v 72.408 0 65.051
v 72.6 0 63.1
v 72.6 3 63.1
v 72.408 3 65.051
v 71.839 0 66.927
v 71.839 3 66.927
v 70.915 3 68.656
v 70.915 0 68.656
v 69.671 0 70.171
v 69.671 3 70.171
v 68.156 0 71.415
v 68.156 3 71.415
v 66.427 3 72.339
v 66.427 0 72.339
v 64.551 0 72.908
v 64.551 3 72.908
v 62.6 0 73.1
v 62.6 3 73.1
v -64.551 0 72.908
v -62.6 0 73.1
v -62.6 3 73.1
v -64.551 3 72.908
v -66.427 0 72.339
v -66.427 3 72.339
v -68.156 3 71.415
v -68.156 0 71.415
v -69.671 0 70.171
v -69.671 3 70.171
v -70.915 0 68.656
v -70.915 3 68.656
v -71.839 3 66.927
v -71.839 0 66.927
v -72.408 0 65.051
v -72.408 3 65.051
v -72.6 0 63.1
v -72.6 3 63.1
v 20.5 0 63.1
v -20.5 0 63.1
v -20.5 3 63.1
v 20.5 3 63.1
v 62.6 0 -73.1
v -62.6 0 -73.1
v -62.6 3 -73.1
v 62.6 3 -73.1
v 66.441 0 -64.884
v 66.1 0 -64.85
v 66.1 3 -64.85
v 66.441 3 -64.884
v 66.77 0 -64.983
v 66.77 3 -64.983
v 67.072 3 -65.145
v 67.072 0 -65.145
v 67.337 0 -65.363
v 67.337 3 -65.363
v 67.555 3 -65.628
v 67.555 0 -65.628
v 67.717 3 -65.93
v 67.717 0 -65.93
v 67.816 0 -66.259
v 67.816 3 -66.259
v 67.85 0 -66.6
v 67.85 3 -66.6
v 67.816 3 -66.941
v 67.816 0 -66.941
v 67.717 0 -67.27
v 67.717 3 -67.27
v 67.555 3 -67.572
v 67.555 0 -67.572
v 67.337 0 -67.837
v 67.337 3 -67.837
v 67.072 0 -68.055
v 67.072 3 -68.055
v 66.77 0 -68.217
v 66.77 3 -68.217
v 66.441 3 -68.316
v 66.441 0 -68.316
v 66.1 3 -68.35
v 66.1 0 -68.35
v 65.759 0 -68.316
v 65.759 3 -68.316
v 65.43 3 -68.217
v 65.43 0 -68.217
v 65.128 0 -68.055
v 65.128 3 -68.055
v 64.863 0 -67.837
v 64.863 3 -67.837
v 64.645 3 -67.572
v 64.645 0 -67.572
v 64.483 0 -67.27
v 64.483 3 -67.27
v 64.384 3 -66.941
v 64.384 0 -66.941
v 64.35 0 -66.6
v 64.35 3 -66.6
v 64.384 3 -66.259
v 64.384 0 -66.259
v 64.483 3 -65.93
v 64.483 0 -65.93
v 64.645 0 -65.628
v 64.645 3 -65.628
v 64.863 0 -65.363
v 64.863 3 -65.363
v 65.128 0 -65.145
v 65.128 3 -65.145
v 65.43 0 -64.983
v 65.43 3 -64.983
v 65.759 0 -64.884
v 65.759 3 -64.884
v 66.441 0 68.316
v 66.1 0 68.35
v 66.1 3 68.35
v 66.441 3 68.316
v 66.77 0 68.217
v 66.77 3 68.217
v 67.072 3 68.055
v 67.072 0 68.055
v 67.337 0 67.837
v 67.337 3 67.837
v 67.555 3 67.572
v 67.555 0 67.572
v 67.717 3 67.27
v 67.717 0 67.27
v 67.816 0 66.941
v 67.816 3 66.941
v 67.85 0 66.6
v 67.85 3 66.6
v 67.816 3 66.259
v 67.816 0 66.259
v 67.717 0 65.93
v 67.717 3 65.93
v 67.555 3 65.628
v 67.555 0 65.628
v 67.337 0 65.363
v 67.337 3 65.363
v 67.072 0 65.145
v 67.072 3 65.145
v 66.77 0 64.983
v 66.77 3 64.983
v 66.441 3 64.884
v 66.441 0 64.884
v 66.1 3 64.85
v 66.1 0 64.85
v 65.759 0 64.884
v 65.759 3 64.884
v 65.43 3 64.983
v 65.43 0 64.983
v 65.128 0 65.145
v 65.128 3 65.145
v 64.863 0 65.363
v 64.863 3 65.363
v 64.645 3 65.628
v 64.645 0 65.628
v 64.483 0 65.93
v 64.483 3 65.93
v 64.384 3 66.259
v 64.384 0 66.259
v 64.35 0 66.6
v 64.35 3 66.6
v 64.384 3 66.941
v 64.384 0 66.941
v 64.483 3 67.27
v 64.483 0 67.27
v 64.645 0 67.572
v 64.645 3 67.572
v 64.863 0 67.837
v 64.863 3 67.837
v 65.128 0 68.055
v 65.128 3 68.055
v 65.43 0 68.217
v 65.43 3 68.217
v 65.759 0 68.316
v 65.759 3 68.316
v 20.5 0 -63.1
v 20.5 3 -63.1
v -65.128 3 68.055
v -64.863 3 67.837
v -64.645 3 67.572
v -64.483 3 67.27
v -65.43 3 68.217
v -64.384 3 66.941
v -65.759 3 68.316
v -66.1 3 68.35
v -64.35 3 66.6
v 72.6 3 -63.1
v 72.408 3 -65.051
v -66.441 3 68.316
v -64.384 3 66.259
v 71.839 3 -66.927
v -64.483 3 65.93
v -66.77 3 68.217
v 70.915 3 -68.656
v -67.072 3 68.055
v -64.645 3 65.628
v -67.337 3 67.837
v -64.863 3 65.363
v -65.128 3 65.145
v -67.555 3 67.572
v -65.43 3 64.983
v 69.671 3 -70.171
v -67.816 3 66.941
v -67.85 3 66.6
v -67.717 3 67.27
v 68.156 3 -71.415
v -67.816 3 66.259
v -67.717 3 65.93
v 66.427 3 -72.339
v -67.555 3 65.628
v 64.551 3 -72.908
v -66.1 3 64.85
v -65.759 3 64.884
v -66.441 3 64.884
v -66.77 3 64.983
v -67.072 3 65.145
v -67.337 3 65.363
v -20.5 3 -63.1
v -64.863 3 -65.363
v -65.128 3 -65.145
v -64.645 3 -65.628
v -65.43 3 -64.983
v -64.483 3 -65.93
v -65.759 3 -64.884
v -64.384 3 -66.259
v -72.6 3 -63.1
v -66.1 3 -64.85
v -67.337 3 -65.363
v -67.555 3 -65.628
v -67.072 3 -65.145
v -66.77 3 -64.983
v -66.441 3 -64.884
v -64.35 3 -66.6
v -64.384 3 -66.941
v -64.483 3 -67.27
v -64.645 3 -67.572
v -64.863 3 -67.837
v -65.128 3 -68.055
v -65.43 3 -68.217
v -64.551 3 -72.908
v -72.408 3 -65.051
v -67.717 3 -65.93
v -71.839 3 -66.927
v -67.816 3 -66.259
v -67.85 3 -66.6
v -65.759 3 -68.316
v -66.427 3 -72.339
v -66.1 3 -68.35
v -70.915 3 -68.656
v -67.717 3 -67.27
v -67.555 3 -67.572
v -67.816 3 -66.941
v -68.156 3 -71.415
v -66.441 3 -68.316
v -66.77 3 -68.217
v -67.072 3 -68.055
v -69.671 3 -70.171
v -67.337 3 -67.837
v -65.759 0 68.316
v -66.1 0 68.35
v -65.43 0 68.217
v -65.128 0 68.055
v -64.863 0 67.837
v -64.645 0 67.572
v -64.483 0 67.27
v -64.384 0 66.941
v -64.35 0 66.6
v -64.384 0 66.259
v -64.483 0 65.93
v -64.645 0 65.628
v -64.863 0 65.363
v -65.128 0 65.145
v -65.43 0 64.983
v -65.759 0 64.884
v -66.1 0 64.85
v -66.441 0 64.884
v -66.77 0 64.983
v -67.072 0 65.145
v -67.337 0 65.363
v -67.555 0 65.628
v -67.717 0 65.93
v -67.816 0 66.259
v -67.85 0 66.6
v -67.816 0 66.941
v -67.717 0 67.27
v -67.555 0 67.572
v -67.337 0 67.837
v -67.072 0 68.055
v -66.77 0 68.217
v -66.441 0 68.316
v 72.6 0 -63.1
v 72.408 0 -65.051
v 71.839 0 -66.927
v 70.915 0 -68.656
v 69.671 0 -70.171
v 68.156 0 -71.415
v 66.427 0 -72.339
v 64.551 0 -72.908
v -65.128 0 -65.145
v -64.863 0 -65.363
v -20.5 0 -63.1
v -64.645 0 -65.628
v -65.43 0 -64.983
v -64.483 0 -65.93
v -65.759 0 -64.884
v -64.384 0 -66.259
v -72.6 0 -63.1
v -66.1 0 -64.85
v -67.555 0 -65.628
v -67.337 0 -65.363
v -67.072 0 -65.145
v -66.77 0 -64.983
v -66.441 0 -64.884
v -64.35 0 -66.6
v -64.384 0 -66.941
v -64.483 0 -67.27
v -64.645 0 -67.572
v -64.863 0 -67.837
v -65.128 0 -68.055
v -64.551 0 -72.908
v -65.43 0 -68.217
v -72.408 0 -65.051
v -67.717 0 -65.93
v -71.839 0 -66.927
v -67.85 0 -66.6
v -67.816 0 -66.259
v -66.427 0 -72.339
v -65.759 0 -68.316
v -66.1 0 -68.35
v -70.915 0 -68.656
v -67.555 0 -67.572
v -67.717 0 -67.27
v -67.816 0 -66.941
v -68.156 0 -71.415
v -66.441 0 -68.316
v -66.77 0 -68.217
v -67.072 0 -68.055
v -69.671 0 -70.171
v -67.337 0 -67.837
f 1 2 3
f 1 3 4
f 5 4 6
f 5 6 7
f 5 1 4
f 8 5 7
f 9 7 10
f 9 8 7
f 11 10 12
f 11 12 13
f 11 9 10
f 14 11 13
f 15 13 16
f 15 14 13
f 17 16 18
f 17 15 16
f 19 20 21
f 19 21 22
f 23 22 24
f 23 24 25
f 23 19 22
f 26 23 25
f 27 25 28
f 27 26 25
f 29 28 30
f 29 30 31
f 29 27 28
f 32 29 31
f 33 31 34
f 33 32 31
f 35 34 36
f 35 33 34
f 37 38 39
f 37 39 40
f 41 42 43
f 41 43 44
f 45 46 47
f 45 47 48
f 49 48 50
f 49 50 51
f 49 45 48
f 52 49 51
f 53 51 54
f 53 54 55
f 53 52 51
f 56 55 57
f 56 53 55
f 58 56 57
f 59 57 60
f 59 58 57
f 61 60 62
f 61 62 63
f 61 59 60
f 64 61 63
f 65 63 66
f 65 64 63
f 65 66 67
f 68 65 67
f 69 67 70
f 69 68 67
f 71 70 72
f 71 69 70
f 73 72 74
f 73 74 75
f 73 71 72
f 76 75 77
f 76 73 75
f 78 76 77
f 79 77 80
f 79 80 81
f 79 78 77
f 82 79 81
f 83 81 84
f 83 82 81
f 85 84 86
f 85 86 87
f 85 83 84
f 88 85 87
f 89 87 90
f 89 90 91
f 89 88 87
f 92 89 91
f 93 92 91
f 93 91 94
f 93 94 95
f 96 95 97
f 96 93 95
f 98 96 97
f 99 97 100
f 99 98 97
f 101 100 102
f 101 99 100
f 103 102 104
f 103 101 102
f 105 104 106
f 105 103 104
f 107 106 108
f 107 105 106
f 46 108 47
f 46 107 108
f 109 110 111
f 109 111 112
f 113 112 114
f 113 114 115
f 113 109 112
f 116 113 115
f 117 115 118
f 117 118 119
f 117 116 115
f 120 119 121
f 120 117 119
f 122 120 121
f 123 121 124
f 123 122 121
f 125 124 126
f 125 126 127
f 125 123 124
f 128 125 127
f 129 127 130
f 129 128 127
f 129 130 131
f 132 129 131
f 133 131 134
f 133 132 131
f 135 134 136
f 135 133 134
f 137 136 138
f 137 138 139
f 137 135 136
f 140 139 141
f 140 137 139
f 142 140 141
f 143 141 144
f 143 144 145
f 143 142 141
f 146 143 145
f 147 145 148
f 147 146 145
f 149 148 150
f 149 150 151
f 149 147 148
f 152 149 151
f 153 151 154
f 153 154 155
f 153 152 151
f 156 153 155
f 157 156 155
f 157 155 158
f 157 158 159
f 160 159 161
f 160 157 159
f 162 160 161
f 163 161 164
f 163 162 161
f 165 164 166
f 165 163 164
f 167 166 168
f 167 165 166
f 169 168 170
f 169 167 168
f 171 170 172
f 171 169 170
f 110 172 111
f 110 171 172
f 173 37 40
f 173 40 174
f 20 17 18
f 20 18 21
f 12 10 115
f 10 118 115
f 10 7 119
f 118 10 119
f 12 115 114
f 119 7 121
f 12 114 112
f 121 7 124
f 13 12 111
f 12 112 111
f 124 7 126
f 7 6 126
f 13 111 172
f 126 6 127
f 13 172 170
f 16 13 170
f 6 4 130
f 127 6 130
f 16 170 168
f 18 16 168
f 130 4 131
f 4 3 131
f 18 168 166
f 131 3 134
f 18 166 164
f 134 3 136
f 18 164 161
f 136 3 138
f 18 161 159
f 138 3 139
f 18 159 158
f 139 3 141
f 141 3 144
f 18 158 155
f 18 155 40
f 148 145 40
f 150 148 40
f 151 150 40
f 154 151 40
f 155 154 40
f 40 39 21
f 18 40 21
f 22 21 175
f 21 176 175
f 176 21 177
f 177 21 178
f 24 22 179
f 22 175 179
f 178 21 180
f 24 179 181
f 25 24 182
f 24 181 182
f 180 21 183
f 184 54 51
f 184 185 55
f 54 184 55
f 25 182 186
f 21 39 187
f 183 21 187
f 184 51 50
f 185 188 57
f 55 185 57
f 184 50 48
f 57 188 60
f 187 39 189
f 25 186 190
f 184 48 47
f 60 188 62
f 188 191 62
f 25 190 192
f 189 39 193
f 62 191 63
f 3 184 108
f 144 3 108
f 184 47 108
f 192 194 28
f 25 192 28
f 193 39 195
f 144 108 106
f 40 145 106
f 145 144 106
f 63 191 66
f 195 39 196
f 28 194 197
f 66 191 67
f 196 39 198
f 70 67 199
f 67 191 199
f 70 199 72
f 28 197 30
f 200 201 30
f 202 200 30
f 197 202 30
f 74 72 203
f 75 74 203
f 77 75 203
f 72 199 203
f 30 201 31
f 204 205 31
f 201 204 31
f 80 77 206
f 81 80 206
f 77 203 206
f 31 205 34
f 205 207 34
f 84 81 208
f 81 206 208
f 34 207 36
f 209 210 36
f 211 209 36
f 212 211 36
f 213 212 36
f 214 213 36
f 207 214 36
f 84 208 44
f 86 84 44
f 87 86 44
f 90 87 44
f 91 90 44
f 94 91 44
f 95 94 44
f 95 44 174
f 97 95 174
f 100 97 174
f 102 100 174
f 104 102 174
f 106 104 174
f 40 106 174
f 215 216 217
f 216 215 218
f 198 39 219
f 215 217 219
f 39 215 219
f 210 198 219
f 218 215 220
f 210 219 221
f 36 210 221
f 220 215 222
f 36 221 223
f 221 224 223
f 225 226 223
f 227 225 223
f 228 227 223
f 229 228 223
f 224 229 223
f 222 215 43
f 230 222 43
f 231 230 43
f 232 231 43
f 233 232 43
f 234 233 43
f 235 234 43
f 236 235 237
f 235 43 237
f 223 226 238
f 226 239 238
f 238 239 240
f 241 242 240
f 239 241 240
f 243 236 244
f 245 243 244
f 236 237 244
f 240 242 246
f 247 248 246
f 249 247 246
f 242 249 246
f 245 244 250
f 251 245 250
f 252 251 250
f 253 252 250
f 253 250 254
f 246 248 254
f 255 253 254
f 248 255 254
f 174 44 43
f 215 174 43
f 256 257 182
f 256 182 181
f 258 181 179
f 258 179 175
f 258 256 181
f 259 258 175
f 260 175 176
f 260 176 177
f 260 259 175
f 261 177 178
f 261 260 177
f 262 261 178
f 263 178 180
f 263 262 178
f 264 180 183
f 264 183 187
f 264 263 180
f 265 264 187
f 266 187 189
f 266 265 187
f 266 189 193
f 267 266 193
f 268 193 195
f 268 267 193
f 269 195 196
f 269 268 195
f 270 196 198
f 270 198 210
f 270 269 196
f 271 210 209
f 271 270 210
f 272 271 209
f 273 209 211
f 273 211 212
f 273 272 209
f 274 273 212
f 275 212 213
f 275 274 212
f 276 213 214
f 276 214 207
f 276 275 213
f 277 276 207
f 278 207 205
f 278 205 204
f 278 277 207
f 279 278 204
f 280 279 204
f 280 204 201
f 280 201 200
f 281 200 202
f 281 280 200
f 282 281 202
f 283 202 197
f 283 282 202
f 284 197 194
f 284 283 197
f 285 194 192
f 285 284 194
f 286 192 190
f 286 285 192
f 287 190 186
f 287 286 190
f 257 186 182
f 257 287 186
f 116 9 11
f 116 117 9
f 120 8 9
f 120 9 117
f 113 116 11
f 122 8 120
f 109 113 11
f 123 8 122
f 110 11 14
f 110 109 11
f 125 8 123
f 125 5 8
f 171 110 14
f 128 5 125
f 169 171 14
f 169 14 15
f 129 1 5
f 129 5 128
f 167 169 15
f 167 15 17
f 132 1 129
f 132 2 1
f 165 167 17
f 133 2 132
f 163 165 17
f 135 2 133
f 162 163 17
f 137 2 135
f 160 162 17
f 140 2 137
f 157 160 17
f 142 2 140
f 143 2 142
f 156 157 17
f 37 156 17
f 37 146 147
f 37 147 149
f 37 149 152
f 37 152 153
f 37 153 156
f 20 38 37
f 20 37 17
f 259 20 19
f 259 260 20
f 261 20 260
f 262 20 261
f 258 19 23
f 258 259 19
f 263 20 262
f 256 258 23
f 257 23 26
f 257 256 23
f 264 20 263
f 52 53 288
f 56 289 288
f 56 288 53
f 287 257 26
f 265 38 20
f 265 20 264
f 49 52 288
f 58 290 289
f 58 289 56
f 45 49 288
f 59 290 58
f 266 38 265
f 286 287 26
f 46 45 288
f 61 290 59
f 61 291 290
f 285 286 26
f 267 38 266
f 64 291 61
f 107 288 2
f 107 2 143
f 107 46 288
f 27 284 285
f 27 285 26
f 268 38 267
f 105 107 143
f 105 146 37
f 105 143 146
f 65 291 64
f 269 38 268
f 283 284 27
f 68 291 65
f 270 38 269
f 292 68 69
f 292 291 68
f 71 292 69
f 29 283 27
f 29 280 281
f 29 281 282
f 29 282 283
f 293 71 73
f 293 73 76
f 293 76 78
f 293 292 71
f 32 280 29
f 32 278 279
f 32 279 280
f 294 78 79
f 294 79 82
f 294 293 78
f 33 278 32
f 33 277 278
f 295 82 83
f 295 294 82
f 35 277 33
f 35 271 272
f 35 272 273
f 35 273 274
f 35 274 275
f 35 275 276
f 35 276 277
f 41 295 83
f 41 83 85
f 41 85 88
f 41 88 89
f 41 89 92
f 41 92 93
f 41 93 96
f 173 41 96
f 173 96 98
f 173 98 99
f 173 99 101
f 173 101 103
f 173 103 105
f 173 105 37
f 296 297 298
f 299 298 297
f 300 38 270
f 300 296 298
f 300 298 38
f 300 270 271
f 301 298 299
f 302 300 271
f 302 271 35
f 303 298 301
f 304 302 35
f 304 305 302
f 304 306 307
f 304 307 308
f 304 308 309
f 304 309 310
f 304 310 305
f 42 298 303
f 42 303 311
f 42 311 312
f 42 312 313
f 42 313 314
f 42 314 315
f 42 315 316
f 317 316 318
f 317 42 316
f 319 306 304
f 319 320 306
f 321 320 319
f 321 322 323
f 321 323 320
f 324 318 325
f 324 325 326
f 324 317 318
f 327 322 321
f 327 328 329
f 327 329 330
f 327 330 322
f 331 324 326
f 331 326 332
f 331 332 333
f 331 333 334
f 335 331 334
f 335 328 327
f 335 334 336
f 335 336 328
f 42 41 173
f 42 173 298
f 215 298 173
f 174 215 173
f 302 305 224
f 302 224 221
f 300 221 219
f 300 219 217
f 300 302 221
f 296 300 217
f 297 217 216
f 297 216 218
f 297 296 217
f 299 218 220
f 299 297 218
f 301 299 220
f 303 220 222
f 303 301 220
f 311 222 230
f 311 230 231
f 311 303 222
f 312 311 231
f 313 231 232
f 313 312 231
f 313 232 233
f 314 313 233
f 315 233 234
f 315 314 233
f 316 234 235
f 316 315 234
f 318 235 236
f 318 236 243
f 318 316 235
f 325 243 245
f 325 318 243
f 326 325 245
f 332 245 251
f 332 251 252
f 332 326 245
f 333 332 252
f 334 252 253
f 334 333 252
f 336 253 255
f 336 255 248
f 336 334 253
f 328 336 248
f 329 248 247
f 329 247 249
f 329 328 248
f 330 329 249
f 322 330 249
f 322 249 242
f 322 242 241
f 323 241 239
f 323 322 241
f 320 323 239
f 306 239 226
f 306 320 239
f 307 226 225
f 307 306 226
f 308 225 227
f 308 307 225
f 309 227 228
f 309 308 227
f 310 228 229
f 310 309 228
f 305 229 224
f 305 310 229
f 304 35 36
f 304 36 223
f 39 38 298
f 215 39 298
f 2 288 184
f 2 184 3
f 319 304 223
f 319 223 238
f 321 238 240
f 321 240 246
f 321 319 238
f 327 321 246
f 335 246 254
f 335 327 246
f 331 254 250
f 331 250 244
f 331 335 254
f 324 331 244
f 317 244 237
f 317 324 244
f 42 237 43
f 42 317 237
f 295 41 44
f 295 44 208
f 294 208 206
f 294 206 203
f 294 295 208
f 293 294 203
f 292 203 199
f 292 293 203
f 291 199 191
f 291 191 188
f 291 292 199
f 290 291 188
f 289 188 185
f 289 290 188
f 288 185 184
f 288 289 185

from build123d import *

# Parameters (mm, degrees)
ESQUISSE1_R        = 1.75
ESQUISSE1_W        = 41
ESQUISSE1_H        = 126.2
BOSS_EXTRU_1_DEPTH = 3


with BuildPart() as part:
    # Esquisse1 → Boss.-Extru.1 (new body)
    with BuildSketch(Plane(origin=(0, 0, 0), x_dir=(1, 0, 0), z_dir=(0, 1, 0))):
        with BuildLine():
            Line((-72.6, -63.1), (-72.6, 63.1))
            ThreePointArc((-72.6, 63.1), (-69.671067812, 70.171067812), (-62.6, 73.1))
            Line((-62.6, 73.1), (62.6, 73.1))
            ThreePointArc((62.6, 73.1), (69.671067812, 70.171067812), (72.6, 63.1))
            Line((72.6, 63.1), (72.6, -63.1))
            ThreePointArc((72.6, -63.1), (69.671067812, -70.171067812), (62.6, -73.1))
            Line((62.6, -73.1), (-62.6, -73.1))
            ThreePointArc((-62.6, -73.1), (-69.671067812, -70.171067812), (-72.6, -63.1))
        make_face()
        with Locations(Location((-66.1, 66.6, 0), (0, 0, 270))):
            Circle(ESQUISSE1_R, mode=Mode.SUBTRACT)
        with Locations(Location((66.1, 66.6, 0), (0, 0, 270))):
            Circle(ESQUISSE1_R, mode=Mode.SUBTRACT)
        with Locations(Location((66.1, -66.6, 0), (0, 0, 270))):
            Circle(ESQUISSE1_R, mode=Mode.SUBTRACT)
        with Locations(Location((-66.1, -66.6, 0), (0, 0, 270))):
            Circle(ESQUISSE1_R, mode=Mode.SUBTRACT)
        Rectangle(ESQUISSE1_W, ESQUISSE1_H, mode=Mode.SUBTRACT)
    extrude(amount=BOSS_EXTRU_1_DEPTH)


solid = part.part
